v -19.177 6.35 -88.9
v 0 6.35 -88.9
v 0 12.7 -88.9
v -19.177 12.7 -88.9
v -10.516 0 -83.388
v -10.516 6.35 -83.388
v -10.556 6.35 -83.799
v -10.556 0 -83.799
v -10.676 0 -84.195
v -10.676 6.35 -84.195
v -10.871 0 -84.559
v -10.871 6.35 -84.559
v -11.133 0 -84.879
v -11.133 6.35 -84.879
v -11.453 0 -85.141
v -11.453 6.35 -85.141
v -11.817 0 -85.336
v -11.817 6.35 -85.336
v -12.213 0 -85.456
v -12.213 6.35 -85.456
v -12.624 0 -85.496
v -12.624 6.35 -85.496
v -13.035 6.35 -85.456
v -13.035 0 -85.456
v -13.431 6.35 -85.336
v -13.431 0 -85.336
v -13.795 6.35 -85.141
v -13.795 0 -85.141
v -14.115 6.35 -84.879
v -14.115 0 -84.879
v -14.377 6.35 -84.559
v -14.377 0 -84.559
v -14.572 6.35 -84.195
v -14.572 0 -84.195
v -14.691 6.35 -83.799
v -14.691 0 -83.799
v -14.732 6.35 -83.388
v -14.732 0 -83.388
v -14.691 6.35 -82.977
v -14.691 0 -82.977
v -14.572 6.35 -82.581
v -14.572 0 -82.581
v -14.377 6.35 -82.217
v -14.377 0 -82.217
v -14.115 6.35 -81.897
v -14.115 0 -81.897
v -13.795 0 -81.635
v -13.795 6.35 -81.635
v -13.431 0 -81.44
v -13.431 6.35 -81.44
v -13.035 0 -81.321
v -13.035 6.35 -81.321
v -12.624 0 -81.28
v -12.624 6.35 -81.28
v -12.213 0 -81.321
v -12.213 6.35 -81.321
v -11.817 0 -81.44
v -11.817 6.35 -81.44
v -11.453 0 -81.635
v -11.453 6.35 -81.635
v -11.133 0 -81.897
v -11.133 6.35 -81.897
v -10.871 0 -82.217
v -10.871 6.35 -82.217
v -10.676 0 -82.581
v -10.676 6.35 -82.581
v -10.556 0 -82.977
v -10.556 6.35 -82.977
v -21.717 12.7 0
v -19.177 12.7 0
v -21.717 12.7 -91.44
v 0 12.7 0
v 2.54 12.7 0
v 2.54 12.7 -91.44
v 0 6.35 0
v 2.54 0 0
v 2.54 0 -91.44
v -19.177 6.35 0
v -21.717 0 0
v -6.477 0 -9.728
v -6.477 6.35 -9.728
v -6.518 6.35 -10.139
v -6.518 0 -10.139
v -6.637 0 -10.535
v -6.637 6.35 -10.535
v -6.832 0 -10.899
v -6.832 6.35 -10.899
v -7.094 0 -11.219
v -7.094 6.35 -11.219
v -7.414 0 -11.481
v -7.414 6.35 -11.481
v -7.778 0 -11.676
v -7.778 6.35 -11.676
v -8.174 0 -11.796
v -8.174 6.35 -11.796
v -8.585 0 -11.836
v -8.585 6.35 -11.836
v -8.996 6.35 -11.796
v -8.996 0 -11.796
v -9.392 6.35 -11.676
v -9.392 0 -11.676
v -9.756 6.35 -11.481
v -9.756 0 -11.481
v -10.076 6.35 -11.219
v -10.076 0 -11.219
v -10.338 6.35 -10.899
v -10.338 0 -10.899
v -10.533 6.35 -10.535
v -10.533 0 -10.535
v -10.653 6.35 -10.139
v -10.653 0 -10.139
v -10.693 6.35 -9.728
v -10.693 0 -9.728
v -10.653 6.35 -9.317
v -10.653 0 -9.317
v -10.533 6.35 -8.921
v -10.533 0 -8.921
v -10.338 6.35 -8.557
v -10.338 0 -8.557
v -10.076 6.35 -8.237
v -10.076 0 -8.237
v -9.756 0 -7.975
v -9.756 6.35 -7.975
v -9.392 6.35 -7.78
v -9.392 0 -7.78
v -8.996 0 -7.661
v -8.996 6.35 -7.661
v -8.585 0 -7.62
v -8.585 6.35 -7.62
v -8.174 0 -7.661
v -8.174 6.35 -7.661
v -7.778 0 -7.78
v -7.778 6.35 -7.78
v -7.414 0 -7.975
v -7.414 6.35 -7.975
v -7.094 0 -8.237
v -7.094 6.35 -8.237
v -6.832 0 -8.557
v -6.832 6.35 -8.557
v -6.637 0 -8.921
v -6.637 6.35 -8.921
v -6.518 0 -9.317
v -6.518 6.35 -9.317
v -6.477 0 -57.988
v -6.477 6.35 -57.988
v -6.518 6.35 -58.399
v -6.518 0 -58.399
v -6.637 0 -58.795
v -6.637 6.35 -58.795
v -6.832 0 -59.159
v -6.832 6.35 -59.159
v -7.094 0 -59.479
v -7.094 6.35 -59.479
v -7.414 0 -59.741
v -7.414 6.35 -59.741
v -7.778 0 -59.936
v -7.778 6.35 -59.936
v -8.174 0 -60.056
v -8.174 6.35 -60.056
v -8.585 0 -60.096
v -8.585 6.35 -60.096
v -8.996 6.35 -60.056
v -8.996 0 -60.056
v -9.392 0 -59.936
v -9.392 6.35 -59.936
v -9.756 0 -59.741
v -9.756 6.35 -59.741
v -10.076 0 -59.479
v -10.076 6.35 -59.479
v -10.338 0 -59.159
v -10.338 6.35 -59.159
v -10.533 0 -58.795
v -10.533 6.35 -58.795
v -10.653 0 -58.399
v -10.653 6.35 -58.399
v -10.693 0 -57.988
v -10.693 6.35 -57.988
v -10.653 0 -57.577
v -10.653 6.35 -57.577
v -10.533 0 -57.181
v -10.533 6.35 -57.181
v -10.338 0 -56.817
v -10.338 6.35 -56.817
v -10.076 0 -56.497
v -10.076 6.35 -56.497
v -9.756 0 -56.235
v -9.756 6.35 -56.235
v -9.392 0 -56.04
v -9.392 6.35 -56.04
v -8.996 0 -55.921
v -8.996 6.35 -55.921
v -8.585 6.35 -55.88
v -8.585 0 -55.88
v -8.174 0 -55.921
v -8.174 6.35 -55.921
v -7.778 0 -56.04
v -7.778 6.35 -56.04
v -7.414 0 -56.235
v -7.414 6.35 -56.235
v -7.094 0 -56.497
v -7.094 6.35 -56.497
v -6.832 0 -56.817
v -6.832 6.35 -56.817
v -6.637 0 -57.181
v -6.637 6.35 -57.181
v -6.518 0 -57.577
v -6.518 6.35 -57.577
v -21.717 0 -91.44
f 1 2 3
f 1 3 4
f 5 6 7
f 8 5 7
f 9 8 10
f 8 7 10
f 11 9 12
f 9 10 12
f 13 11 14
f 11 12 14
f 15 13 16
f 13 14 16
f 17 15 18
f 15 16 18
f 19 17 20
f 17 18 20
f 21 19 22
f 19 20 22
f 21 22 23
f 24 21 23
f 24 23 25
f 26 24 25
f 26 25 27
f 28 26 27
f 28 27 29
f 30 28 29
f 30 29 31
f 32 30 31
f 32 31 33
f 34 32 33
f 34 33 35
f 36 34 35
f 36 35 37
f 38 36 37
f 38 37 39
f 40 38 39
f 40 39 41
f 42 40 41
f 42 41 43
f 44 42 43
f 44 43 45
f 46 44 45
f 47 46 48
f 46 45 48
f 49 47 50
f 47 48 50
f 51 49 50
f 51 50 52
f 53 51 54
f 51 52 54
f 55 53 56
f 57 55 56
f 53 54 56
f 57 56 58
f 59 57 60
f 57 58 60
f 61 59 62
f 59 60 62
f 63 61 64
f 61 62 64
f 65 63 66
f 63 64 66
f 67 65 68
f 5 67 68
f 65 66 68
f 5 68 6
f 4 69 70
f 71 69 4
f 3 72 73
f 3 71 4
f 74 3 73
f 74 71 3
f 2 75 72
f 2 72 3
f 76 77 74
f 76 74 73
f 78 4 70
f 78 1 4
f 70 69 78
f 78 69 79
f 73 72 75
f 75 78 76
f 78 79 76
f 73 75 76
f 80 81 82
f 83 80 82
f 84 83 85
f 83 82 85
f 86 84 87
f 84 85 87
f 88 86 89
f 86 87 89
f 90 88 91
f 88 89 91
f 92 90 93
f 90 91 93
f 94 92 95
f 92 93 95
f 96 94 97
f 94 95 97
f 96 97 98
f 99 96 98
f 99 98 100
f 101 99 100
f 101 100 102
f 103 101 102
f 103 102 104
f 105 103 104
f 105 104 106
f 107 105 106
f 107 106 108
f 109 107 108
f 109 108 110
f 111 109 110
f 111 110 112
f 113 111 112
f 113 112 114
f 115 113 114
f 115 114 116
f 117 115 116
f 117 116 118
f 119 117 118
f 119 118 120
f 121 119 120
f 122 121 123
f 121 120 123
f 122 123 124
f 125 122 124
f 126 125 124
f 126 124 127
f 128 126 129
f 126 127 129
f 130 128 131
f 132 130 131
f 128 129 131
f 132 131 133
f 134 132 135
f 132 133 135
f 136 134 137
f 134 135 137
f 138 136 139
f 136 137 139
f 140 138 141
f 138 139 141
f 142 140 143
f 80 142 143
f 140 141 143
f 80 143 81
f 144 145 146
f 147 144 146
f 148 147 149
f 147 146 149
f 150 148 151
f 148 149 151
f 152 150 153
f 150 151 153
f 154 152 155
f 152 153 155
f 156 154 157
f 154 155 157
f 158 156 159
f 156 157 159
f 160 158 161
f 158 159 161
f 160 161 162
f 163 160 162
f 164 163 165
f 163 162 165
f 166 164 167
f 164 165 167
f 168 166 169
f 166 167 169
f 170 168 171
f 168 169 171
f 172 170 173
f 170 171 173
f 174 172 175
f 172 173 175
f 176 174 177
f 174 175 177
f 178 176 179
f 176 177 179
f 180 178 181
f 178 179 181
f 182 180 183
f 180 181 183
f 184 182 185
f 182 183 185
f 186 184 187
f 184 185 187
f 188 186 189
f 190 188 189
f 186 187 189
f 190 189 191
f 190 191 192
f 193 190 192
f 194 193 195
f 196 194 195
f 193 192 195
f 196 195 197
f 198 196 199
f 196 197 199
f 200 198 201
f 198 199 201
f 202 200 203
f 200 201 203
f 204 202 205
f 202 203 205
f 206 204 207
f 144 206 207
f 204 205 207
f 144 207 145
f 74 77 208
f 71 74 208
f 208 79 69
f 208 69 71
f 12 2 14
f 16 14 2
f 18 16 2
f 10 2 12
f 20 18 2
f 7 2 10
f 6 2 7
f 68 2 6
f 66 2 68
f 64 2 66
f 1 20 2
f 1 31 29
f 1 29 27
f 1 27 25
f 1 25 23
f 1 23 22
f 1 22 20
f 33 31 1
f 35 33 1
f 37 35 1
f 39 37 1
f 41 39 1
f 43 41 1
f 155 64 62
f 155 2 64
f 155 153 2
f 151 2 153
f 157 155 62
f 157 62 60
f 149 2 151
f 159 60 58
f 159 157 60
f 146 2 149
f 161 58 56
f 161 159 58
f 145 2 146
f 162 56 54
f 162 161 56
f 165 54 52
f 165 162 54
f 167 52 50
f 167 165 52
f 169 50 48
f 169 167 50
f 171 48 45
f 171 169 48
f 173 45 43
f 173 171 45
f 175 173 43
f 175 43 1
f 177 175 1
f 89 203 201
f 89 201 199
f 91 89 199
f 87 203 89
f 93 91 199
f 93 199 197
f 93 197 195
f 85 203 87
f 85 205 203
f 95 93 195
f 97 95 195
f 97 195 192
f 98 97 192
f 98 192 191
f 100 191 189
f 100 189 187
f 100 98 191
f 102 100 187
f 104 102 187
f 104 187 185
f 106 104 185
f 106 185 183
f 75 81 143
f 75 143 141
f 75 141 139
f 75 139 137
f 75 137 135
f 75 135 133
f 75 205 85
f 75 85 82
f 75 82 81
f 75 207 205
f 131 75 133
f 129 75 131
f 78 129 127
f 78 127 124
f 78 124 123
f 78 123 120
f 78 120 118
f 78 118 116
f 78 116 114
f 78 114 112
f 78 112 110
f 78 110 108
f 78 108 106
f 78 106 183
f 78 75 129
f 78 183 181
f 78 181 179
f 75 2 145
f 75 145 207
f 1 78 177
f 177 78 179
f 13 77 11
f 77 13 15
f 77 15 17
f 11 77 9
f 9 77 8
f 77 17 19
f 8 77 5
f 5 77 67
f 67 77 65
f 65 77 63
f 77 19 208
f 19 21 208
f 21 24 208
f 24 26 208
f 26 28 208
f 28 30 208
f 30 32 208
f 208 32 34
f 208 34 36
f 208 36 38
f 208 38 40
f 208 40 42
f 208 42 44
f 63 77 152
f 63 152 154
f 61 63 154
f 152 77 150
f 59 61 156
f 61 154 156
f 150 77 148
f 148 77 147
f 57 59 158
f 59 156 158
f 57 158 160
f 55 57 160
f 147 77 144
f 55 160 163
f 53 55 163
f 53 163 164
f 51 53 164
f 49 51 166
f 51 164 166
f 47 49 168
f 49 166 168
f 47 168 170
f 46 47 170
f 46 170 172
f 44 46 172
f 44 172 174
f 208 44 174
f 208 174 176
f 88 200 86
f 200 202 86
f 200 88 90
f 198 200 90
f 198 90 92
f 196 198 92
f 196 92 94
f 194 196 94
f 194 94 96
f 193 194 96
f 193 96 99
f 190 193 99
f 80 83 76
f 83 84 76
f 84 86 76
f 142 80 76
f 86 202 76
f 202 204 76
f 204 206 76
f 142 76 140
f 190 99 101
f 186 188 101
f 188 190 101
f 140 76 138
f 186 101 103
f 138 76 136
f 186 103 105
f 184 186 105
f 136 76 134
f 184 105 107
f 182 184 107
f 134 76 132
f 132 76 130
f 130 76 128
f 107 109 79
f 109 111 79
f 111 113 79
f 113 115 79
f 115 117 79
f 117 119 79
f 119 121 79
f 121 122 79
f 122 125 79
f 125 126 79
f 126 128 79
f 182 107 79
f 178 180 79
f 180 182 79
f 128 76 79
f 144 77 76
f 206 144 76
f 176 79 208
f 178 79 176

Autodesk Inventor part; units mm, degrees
ref_plane "YZ Plane" through (0, 0, 0) normal (1, 0, 0) x (0, 1, 0)
ref_plane "XZ Plane" through (0, 0, 0) normal (0, 1, 0) x (-1, 0, 0)
ref_plane "XY Plane" through (0, 0, 0) normal (0, 0, 1) x (1, 0, 0)
sketch "Sketch1" plane through (0, 0, 0) normal (0, 1, 0) x (-1, 0, 0)
  line L0 (0, 0) -> (19.177, 0)
  line L1 (19.177, 0) -> (19.177, -88.9)
  line L2 (19.177, -88.9) -> (0, -88.9)
  line L3 (0, -88.9) -> (0, 0)
  line L4 (0, -88.9) -> (0, -91.44)
  line L5 (0, -91.44) -> (19.177, -91.44)
  line L6 (19.177, -91.44) -> (19.177, -88.9)
  line L7 (19.177, 0) -> (21.717, 0)
  line L8 (21.717, 0) -> (21.717, -91.44)
  line L9 (21.717, -91.44) -> (19.177, -91.44)
  line L10 (0, -91.44) -> (-2.54, -91.44)
  line L11 (-2.54, -91.44) -> (-2.54, 0)
  line L12 (-2.54, 0) -> (0, 0)
  dimension "d0" = 19.177
  dimension "d1" = 88.9
  dimension "d2" = 2.54
  dimension "d8" = 2.54
  dimension "d9" = 2.54
extrude "Extrusion1" add sketch "Sketch1" along normal blind 6.35
sketch "Sketch4" plane through (0, 6.35, 0) normal (0, 1, 0) x (1, 0, 0)
  line L0 (-21.717, 0) -> (2.54, 0) projected
  line L1 (-21.717, 0) -> (-19.177, 0)
  line L2 (2.54, 91.44) -> (-21.717, 91.44) projected
  line L3 (-21.717, 0) -> (-21.717, 91.44)
  line L4 (-21.717, 91.44) -> (2.54, 91.44)
  line L5 (2.54, 91.44) -> (2.54, 0)
  line L6 (0, 0) -> (0, 88.9)
  line L7 (0, 88.9) -> (-19.177, 88.9)
  line L8 (-19.177, 88.9) -> (-19.177, 0)
  line L9 (-19.177, 0) -> (-21.717, 0)
  dimension "d12" = 2.54
  dimension "d13" = 88.9
extrude "Extrusion3" add sketch "Sketch4" along normal blind 6.35 contours L3 L2 L5 L0 L6 L7 L8
sketch "Sketch5" plane through (0, 6.35, 0) normal (0, 1, 0) x (1, 0, 0)
  line L0 (-19.177, 88.9) -> (0, 88.9) projected
  line L1 (-19.177, 88.9) -> (-12.6238, 88.9)
  line L2 (-12.6238, 88.9) -> (-12.6238, 83.3882)
  circle A0 centre (-12.6238, 83.3882) radius 2.1082
  line L3 (-12.6238, 83.3882) -> (-8.5852, 83.3882)
  line L4 (-8.5852, 83.3882) -> (-8.5852, 57.9882)
  circle A1 centre (-8.5852, 57.9882) radius 2.1082
  line L5 (-8.5852, 57.9882) -> (-8.5852, 9.7282)
  circle A2 centre (-8.5852, 9.7282) radius 2.1082
  point P0 (0, 0)
  dimension "d16" = 6.5532
  dimension "d17" = 5.5118
  dimension "d18" = 4.2164
  dimension "d19" = 4.0386
  dimension "d20" = 25.4
  dimension "d21" = 4.2164
  dimension "d22" = 48.26
  dimension "d23" = 4.2164
extrude "Extrusion4" cut sketch "Sketch5" against normal blind 6.35
properties part number "wing hole drill"
